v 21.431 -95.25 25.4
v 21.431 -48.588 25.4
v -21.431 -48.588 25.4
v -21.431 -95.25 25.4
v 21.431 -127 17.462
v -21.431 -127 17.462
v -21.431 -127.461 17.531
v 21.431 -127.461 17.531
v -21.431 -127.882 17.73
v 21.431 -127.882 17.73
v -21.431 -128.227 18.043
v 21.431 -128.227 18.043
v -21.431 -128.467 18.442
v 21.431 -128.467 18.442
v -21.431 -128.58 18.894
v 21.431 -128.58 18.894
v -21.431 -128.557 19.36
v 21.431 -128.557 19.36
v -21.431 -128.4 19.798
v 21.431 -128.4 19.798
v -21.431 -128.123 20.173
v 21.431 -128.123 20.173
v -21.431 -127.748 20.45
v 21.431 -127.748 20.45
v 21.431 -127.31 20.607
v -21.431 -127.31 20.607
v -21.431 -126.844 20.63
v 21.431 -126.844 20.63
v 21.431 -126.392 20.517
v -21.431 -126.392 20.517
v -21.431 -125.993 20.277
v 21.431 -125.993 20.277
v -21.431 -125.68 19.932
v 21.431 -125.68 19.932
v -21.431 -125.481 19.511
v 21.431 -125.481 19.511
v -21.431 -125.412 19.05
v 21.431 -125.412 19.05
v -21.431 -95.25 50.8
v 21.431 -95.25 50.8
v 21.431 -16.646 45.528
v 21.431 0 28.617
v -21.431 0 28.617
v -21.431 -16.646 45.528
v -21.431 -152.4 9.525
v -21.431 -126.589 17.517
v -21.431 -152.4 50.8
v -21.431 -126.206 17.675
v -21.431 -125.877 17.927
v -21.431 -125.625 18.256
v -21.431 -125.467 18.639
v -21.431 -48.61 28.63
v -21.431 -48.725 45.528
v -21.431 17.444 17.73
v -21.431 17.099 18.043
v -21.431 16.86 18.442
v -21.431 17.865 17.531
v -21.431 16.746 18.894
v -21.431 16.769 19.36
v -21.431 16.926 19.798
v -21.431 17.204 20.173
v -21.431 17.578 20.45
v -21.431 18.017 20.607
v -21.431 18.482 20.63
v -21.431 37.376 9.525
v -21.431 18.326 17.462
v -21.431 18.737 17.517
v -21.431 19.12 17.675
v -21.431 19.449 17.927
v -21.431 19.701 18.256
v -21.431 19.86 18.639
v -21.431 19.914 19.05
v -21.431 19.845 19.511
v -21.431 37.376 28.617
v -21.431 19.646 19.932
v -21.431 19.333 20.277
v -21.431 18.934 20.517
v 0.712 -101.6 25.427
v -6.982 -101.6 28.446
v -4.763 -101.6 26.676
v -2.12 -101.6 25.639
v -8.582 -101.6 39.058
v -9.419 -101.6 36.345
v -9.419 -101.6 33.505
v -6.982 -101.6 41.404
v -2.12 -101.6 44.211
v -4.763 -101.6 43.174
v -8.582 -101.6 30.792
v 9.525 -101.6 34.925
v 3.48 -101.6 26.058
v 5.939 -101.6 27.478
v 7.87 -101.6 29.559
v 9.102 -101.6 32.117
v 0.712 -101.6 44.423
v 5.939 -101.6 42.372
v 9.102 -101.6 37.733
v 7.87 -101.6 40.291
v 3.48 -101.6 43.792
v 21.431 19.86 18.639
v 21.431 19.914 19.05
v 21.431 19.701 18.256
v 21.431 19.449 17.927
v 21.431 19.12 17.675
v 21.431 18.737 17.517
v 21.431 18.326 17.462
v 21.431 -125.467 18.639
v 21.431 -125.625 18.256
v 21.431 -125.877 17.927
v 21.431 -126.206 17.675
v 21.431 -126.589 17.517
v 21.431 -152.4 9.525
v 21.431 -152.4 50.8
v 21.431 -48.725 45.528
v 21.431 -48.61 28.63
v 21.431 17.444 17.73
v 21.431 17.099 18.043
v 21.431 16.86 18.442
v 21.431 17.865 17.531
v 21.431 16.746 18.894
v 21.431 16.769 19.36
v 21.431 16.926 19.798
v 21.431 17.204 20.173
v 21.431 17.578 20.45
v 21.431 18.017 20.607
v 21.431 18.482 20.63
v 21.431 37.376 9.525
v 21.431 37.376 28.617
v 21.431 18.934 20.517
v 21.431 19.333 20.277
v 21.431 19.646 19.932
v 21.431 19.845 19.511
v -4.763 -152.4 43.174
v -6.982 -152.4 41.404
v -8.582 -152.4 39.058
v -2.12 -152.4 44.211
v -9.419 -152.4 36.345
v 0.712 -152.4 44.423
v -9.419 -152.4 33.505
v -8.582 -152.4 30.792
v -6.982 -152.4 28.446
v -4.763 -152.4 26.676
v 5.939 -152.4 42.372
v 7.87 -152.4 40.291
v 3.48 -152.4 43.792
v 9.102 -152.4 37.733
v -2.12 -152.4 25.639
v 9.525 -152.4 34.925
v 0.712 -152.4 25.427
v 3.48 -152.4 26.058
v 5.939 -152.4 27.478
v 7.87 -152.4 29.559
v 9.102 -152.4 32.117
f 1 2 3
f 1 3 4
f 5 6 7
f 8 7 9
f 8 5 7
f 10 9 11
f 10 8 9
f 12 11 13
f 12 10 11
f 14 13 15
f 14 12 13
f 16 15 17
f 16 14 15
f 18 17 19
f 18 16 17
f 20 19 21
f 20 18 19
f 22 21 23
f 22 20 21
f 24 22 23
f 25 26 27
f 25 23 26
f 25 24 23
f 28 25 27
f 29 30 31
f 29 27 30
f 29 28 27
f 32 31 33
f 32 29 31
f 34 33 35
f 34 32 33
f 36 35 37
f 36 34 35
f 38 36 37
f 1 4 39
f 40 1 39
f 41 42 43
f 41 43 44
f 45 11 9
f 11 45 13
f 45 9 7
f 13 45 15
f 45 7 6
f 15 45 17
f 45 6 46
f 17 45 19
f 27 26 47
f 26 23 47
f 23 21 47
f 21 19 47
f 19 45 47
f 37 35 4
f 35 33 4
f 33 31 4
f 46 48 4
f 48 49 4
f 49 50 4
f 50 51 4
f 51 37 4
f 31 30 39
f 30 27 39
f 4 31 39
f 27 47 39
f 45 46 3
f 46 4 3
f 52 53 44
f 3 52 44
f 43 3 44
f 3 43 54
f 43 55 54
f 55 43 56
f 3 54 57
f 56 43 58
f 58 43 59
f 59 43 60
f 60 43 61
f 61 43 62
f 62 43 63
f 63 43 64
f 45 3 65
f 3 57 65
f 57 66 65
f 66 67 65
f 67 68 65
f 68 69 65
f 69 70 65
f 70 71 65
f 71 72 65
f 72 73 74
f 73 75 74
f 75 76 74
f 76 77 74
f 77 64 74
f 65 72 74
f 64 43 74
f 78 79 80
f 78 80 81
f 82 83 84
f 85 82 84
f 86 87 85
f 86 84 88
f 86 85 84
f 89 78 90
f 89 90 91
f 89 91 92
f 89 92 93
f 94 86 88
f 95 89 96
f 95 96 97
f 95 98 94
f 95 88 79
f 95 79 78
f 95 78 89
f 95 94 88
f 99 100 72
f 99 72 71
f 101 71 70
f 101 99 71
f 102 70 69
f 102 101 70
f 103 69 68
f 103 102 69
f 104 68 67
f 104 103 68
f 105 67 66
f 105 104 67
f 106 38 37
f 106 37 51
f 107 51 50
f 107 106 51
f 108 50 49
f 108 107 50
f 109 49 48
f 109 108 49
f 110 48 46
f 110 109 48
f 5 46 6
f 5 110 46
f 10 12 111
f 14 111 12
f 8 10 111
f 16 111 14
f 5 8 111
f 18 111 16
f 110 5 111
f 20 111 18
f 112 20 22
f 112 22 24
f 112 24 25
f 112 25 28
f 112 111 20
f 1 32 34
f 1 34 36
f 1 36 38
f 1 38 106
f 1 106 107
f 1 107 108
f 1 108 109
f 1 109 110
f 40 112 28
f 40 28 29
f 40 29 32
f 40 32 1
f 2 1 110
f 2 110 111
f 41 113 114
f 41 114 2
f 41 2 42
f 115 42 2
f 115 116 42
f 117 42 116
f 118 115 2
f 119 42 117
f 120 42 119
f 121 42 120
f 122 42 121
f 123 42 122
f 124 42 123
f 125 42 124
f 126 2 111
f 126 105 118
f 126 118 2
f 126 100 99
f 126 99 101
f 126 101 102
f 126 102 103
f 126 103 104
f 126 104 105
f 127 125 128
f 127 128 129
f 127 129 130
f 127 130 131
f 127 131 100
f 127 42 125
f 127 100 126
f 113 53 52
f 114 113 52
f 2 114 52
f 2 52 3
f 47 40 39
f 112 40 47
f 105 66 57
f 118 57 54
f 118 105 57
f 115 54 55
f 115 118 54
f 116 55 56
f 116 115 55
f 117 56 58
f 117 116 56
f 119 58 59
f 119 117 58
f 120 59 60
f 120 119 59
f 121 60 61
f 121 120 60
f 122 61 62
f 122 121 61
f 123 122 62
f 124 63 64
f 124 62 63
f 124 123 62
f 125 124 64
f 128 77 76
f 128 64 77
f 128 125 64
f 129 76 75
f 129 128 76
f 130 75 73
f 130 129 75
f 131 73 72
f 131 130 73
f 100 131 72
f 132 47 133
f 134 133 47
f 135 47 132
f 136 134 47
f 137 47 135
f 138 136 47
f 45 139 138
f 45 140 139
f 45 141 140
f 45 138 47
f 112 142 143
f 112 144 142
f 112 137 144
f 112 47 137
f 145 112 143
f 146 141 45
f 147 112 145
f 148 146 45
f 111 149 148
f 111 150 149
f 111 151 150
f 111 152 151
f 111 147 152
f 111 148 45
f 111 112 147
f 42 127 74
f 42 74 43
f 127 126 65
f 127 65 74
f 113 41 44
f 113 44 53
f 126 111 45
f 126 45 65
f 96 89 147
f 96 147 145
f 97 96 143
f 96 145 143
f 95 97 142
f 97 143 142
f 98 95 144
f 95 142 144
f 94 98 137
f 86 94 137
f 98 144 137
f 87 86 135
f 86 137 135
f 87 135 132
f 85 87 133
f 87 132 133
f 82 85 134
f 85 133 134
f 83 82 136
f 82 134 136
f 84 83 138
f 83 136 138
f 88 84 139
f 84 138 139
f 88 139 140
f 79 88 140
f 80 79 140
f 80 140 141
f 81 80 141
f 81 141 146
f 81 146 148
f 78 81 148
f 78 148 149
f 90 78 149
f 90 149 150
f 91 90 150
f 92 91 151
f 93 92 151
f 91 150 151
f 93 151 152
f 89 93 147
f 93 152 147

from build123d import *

# Parameters (mm, degrees)
F1_DEPTH = 21.43125
F2_R     = 9.525
F3_DEPTH = 50.8
F5_DEPTH = 42.8635


with BuildPart() as f1:
    # F0 (on Right) → F1 (new body, symmetric)
    with BuildSketch(Plane.YZ):
        Polygon((-152.4, 69.85), (-152.4, 0), (152.4, 0), (152.4, 19.05), align=None)
    extrude(amount=F1_DEPTH, both=True)

    # F2 (on face) → F3 (cut)
    with BuildSketch(Plane.XZ.offset(152.4)):
        with Locations((0, 34.925)):
            Circle(F2_R)
    extrude(amount=-F3_DEPTH, mode=Mode.SUBTRACT)

    # F4 (on face) → F5 (intersect, through all)
    with BuildSketch(Plane.YZ.offset(21.43125)):
        Polygon((-16.6460395549, 45.5284491181), (-48.7253032625, 45.5284491181), (-48.6101253426, 28.6297574639), (-48.5881119967, 25.4), (-48.7253032625, 25.4), (-95.2500006139, 25.4), (-95.2500006139, 50.7999987721), (-152.4, 50.7999987721), (-152.4, 9.525), (-127, 9.525), (18.3262217238, 9.525), (37.3762217238, 9.525), (37.3762217238, 28.6172106862), (0, 28.6172106862), align=None)
        with BuildLine():
            ThreePointArc((-125.4125, 19.05), (-125.8774679849, 17.9274679849), (-127, 17.4625))
            ThreePointArc((-127, 17.4625), (-128.1225320151, 20.1725320151), (-125.4125, 19.05))
        make_face(mode=Mode.SUBTRACT)
        with BuildLine():
            ThreePointArc((19.9137217238, 19.05), (19.448753739, 17.9274679849), (18.3262217238, 17.4625))
            ThreePointArc((18.3262217238, 17.4625), (17.2036897087, 20.1725320151), (19.9137217238, 19.05))
        make_face(mode=Mode.SUBTRACT)
    extrude(amount=-F5_DEPTH, mode=Mode.INTERSECT)


solid = f1.part
